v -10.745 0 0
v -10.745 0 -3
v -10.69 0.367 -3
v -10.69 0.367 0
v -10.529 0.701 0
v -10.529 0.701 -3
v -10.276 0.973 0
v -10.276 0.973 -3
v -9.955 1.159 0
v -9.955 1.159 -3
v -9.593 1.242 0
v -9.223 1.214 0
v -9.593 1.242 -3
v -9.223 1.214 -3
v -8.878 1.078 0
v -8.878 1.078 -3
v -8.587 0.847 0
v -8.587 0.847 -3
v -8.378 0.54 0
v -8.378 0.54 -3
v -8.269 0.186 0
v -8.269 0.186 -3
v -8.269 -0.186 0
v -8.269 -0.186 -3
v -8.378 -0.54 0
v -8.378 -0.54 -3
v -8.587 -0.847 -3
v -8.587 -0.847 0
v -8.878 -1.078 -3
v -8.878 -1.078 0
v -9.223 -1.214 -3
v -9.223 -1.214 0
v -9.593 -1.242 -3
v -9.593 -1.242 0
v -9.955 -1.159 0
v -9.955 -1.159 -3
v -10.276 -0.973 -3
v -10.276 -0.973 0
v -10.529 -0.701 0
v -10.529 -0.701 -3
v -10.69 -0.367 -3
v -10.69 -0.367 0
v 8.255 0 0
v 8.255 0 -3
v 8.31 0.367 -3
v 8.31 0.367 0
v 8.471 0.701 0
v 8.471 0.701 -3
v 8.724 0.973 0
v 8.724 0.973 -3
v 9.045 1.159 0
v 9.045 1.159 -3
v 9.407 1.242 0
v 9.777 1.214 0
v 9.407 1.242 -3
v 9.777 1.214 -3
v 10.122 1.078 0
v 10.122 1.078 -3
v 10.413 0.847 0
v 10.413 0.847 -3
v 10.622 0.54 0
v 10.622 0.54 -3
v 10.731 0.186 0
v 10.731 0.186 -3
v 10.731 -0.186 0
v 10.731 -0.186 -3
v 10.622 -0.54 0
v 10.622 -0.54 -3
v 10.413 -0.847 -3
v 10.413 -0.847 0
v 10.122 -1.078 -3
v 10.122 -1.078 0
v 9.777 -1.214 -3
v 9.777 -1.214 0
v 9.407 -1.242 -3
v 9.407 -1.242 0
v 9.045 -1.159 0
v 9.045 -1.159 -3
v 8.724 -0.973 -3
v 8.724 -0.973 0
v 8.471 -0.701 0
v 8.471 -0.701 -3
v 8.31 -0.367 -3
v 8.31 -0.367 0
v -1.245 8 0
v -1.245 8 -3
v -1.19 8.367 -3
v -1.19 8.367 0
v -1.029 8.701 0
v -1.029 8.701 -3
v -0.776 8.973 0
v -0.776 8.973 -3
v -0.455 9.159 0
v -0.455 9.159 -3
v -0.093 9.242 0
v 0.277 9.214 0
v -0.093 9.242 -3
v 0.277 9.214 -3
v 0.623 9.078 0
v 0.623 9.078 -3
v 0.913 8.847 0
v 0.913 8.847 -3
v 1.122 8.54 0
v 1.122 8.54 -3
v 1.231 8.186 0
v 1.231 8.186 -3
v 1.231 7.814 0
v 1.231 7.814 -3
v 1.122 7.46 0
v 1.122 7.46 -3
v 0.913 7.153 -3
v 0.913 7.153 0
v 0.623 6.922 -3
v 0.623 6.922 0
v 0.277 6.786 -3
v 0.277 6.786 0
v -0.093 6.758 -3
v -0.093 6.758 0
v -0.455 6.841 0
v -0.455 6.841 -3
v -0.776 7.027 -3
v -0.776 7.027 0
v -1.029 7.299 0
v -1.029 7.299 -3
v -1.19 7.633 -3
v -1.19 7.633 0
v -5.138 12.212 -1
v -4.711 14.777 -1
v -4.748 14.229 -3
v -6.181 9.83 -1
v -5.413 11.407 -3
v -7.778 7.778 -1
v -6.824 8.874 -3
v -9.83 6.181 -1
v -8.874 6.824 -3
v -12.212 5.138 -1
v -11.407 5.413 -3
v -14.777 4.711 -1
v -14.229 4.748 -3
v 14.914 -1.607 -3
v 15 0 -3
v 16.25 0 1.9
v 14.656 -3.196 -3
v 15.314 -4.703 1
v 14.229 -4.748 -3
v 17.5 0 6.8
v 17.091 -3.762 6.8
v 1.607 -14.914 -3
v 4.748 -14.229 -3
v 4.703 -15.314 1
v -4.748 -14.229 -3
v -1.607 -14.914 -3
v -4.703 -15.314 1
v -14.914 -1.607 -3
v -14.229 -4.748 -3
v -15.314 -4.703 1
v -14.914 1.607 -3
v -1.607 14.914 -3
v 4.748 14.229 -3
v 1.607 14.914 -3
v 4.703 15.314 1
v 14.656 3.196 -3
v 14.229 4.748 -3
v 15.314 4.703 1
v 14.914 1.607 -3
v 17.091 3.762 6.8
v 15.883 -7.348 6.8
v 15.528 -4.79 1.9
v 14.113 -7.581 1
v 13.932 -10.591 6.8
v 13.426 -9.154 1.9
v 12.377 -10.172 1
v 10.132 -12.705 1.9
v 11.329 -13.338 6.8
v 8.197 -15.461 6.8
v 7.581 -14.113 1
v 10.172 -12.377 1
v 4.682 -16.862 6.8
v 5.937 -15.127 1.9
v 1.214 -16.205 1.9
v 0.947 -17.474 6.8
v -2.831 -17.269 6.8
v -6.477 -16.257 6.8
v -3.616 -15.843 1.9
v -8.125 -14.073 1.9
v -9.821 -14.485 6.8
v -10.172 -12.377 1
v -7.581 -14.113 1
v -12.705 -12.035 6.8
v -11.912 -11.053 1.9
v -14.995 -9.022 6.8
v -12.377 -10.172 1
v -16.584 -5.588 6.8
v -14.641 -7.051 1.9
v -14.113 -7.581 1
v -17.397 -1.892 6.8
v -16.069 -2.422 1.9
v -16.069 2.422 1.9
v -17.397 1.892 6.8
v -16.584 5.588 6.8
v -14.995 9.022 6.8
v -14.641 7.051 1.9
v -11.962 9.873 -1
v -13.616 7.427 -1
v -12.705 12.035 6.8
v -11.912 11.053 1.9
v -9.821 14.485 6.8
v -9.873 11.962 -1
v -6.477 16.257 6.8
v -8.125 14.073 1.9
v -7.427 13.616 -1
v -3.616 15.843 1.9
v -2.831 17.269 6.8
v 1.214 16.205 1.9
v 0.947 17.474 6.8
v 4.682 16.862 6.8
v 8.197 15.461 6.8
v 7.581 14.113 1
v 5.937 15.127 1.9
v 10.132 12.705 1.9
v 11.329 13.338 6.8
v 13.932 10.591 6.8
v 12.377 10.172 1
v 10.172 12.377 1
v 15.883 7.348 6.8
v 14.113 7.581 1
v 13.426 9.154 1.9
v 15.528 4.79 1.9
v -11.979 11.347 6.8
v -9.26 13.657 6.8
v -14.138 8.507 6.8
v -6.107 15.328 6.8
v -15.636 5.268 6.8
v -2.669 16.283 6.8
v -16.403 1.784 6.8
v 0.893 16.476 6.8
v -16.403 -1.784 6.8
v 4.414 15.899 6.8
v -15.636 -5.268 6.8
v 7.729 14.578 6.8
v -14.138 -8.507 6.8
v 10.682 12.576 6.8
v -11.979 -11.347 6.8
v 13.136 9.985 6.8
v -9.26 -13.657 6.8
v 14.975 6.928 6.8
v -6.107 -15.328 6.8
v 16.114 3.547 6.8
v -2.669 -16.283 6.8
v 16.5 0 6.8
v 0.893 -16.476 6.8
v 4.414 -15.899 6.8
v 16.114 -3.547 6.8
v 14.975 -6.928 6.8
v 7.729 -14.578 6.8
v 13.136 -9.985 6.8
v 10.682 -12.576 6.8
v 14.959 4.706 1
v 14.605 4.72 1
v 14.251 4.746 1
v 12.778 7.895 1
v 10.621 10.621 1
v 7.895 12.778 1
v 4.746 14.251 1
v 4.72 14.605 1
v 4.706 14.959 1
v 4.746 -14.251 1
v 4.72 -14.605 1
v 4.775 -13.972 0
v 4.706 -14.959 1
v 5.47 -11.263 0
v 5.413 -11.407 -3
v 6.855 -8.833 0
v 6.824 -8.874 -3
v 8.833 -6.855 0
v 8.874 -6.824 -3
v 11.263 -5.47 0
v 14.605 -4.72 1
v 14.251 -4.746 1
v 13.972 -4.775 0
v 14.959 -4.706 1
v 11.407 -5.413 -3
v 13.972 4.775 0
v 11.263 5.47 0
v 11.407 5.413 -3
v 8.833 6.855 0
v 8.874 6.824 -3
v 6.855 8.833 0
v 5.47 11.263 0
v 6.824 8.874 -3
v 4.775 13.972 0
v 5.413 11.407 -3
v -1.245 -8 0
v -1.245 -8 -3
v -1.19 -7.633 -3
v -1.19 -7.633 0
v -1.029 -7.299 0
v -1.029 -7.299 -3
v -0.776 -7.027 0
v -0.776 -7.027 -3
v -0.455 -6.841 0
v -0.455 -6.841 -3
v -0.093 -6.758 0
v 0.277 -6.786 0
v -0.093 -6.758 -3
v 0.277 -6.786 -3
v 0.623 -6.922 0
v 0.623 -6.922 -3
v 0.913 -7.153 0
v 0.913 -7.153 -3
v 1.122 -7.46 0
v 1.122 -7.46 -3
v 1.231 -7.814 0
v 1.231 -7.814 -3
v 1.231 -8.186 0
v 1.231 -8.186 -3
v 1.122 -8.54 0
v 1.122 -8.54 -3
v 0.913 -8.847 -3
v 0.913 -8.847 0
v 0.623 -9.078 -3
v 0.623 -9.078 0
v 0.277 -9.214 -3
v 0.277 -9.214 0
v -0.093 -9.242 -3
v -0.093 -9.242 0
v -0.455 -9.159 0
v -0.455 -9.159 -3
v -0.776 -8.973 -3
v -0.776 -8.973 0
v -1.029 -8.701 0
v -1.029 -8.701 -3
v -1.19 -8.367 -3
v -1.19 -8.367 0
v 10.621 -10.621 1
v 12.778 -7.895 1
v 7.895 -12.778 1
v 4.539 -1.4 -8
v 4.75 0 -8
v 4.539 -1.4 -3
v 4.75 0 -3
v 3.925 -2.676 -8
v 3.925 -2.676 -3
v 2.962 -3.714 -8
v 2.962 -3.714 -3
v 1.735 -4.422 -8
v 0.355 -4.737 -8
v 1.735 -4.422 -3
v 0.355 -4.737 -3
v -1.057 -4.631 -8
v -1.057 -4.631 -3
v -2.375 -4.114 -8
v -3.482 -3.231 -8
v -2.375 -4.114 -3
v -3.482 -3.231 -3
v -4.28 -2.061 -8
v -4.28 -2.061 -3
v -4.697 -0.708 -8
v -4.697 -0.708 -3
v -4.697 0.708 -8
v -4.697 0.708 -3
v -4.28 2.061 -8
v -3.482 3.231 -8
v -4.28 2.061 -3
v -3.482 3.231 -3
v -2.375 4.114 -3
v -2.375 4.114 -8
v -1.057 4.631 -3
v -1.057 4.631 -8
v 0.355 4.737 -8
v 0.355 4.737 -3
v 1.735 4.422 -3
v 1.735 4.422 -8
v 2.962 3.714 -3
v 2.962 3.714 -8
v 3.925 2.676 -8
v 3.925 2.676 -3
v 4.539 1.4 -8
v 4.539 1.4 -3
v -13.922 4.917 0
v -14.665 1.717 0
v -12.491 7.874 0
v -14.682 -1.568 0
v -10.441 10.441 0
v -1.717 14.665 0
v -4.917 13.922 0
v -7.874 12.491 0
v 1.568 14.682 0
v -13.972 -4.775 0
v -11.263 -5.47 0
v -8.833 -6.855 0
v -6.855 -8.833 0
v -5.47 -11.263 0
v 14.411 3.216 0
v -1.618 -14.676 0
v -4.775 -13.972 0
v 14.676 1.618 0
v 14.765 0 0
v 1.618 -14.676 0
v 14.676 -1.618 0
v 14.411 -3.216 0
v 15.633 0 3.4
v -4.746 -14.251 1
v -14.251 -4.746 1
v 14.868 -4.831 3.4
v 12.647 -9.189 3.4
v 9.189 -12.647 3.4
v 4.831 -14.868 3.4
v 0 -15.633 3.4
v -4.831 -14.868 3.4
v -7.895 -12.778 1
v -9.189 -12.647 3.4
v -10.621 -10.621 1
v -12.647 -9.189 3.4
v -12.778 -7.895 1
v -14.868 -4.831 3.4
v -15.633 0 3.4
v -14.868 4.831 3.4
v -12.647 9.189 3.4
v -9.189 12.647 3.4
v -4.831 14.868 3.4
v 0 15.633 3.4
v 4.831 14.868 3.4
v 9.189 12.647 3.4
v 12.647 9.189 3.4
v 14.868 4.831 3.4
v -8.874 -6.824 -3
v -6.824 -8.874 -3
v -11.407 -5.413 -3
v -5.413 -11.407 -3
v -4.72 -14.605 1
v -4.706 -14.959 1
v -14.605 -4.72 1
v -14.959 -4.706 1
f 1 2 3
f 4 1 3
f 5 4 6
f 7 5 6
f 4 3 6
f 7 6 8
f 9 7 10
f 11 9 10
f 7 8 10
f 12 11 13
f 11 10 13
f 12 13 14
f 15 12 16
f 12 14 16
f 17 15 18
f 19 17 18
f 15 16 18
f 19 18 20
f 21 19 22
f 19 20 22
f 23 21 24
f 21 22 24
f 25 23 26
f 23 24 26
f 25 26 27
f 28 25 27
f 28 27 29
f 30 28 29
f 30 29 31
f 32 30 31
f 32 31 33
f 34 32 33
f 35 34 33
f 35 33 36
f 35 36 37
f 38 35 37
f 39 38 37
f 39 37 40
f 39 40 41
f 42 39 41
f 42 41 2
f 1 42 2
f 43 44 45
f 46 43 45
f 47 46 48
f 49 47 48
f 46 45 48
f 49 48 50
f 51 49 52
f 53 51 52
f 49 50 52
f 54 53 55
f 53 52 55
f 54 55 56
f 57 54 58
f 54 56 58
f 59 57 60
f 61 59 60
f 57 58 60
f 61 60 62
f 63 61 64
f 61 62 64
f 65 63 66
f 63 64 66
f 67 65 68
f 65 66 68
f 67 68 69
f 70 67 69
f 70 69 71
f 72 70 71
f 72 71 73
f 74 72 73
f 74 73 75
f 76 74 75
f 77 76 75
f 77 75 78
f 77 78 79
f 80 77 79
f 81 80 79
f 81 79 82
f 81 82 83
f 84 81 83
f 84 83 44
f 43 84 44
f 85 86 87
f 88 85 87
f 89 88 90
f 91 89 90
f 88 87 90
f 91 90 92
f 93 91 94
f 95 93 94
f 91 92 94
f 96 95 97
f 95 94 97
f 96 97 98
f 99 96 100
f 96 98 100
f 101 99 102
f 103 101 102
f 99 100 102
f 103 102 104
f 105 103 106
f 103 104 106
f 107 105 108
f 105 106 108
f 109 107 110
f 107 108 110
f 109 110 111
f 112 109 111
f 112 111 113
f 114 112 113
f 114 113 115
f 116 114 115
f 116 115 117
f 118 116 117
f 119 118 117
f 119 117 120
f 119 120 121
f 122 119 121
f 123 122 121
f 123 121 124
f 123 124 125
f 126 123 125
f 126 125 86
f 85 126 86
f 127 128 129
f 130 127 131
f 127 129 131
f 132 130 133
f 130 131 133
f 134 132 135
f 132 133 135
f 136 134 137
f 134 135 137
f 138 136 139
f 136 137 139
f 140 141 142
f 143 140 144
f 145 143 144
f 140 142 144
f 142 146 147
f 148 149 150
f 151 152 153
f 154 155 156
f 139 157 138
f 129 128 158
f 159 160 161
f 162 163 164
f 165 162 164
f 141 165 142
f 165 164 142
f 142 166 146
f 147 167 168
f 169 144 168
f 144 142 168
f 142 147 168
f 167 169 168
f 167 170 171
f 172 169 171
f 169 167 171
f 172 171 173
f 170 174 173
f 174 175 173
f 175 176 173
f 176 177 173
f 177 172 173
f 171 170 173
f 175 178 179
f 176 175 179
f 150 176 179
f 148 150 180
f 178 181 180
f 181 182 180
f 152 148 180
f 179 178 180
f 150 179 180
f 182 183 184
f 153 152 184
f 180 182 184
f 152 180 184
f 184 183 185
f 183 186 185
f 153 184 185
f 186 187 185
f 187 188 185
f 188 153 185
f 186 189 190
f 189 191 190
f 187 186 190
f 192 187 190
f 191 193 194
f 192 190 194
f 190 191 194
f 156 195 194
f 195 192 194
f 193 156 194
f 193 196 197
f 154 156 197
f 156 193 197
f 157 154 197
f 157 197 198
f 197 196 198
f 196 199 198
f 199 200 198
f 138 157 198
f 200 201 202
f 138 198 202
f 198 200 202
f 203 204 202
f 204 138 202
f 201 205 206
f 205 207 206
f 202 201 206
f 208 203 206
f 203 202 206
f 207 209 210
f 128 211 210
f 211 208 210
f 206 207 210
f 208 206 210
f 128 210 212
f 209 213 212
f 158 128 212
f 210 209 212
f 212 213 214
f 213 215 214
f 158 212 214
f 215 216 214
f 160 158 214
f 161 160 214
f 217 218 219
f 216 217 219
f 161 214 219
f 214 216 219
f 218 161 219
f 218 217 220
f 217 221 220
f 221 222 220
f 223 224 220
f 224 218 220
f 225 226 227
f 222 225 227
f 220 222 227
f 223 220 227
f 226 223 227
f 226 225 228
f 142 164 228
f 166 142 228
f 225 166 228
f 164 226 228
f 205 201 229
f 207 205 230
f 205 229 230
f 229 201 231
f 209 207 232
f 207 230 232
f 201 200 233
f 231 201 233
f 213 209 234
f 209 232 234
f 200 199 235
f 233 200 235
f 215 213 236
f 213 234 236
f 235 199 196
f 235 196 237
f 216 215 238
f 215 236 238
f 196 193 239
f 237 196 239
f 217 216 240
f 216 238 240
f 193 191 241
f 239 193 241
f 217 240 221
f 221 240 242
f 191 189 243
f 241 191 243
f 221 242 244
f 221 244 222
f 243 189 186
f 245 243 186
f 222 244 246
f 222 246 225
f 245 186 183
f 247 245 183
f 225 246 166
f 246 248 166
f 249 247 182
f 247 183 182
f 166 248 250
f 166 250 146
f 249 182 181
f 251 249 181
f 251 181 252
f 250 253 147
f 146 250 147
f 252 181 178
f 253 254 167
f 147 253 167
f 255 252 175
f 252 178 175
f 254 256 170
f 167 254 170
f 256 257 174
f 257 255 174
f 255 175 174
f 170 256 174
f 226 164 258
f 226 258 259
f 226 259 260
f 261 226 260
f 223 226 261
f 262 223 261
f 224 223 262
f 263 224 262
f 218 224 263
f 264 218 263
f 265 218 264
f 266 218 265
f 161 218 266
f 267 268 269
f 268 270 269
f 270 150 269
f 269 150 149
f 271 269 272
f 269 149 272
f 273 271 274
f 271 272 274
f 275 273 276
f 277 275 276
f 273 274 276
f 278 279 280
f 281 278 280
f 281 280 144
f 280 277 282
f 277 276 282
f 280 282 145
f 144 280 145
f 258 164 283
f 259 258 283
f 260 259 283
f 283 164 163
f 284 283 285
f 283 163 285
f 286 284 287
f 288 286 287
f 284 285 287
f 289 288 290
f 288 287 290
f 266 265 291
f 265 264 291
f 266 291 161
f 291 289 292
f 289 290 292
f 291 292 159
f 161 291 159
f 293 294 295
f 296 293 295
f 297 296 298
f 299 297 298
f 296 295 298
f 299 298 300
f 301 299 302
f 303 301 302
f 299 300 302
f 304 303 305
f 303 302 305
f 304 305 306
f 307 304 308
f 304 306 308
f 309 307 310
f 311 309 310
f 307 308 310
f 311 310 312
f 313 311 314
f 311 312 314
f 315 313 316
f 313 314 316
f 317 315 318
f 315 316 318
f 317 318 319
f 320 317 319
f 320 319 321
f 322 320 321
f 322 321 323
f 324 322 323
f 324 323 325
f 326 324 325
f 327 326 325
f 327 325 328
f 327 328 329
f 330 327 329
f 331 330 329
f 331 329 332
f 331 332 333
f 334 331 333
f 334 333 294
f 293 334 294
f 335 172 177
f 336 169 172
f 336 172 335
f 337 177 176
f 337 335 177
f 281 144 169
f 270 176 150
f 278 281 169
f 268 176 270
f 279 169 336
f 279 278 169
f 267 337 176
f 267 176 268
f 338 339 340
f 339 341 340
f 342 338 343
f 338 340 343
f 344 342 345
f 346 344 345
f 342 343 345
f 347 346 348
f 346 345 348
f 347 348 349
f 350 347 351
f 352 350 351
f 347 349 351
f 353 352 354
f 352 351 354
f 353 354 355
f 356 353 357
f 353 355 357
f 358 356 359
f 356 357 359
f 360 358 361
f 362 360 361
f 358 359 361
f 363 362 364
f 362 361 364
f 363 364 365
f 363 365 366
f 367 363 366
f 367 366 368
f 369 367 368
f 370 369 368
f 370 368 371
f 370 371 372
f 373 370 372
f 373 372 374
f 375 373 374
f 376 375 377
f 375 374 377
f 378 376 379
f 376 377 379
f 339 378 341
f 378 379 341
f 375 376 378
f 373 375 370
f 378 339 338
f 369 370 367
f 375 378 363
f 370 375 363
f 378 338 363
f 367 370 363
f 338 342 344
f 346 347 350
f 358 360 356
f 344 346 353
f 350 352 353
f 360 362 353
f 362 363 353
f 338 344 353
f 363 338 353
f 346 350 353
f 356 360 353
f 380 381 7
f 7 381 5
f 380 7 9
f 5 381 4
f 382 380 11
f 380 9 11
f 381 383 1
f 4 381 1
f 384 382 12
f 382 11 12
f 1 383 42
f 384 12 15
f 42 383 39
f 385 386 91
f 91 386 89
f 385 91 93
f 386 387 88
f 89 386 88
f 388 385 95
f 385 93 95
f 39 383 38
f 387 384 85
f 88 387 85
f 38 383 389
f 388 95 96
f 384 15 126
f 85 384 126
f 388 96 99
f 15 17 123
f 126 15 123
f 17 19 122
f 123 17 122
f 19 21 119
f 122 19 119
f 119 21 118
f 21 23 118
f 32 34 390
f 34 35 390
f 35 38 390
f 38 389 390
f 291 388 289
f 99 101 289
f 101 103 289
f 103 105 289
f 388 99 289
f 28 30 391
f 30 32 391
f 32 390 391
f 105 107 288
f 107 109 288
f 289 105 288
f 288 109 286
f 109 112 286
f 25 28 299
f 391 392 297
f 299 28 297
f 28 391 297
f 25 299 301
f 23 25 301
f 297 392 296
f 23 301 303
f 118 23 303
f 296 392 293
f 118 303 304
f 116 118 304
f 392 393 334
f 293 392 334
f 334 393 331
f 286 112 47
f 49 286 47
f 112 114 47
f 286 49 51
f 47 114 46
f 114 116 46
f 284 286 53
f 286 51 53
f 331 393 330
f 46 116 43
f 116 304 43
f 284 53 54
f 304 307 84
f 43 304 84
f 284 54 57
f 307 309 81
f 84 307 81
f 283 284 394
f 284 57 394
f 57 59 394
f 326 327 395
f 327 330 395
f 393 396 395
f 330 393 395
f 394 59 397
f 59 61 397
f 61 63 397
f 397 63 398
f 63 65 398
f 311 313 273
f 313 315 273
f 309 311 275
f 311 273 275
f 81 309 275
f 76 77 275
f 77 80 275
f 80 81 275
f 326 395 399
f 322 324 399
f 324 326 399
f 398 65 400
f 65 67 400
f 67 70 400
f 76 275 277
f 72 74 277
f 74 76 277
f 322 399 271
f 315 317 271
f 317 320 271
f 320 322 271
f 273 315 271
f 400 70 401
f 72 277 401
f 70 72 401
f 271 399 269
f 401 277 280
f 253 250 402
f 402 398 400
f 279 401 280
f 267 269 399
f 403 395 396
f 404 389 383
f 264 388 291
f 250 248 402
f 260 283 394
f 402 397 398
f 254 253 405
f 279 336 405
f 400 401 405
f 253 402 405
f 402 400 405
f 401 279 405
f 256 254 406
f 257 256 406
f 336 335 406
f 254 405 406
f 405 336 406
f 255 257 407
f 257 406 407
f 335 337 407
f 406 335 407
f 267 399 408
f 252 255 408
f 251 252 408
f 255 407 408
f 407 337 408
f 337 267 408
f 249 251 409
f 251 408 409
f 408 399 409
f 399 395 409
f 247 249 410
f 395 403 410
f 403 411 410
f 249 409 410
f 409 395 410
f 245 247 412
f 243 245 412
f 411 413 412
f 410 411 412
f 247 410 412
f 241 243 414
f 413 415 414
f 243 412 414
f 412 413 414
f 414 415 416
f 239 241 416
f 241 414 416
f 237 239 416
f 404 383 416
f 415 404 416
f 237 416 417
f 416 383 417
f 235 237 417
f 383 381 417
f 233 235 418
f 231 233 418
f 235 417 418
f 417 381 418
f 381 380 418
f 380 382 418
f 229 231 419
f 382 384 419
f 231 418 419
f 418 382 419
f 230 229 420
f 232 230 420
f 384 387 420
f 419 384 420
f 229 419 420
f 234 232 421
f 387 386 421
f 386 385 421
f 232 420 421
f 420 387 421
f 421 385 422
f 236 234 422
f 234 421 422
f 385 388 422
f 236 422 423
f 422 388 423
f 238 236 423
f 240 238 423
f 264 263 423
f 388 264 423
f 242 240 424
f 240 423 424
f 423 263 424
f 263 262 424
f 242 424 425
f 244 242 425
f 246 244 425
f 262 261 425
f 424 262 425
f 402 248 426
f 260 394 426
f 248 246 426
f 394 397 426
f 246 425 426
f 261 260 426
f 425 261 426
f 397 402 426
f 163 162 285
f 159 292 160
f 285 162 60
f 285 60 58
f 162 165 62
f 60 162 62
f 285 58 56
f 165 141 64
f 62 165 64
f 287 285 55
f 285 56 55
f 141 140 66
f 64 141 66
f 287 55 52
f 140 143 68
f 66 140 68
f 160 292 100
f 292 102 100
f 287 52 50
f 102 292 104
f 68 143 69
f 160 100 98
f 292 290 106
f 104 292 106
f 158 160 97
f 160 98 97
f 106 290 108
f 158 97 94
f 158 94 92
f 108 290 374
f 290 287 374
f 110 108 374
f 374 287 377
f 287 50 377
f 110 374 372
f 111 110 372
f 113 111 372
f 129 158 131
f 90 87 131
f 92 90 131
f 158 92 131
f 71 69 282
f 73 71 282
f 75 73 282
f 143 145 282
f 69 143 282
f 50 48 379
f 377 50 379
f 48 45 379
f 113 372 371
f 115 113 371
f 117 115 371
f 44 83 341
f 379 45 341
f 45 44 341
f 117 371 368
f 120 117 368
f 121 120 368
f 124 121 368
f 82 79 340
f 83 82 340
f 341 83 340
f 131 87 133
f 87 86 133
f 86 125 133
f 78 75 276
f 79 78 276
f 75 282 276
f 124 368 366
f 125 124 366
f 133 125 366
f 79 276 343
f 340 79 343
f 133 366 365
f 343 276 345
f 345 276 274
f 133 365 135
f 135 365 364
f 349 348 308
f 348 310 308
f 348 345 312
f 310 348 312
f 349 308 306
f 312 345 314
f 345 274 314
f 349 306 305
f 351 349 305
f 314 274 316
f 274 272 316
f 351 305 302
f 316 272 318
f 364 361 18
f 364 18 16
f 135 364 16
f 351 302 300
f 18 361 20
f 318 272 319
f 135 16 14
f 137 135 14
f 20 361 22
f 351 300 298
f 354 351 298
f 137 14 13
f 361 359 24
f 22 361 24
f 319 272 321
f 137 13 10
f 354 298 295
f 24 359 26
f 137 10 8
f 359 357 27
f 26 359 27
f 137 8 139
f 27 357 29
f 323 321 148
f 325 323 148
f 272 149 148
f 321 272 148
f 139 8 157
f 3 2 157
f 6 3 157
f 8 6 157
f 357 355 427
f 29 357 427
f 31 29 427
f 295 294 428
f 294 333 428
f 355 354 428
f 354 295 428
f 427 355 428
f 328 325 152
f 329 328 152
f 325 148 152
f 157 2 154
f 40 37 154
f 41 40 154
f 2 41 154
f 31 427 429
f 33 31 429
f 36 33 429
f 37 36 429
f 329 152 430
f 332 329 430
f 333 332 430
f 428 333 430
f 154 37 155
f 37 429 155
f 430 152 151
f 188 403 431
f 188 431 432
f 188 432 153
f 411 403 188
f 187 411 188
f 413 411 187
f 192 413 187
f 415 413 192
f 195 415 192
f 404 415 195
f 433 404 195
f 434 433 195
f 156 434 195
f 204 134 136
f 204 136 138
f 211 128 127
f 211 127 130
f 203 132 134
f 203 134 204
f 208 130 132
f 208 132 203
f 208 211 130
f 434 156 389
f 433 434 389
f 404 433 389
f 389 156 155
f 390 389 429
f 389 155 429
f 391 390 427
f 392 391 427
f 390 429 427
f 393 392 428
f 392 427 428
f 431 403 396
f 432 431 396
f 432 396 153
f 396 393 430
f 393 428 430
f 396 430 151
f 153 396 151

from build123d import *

# Parameters (mm, degrees)
SKETCH_2_R          = 1.245
SKETCH_2_R_2        = 10.5
CUT_EXTRUDE_1_DEPTH = 4
SKETCH_3_R          = 10.5
CUT_EXTRUDE_2_DEPTH = 2


with BuildPart() as part:
    # Эскиз1 → Повернуть1 (revolve)
    with BuildSketch(Plane(origin=(0, 0, 0), x_dir=(0, 0, -1), z_dir=(1, 0, 0)), mode=Mode.PRIVATE) as revolve_1_sk:
        Polygon((0, 0), (8, 0), (8, 4.75), (3, 4.75), (3, 15), (-6.8, 17.5), (-6.8, 16.5), (0, 14.765306122), align=None)
    revolve(revolve_1_sk.sketch.rotate(Axis((0, 0, 0), (0, 0, -1)), 90), axis=Axis((0, 0, 0), (0, 0, -1)))

    # Эскиз2 → Вырез-Вытянуть1 (cut)
    with BuildSketch(Plane(origin=(0, 0, -3), x_dir=(-1, 0, 0), z_dir=(0, 0, -1))):
        with Locations((0, 8)):
            Circle(SKETCH_2_R)
        with Locations((0, -8)):
            Circle(SKETCH_2_R)
        with Locations((9.5, 0)):
            Circle(SKETCH_2_R)
        with Locations((-9.5, 0)):
            Circle(SKETCH_2_R)
        with Locations((-15.202795796, -15.202795796)):
            Circle(SKETCH_2_R_2)
        with Locations((-15.202795796, 15.202795796)):
            Circle(SKETCH_2_R_2)
        with Locations((15.202795796, -15.202795796)):
            Circle(SKETCH_2_R_2)
    extrude(amount=-CUT_EXTRUDE_1_DEPTH, mode=Mode.SUBTRACT)

    # Эскиз3 → Вырез-Вытянуть2 (cut)
    with BuildSketch(Plane(origin=(0, 0, -3), x_dir=(-1, 0, 0), z_dir=(0, 0, -1))):
        with Locations((15.202795796, 15.202795796)):
            Circle(SKETCH_3_R)
    extrude(amount=-CUT_EXTRUDE_2_DEPTH, mode=Mode.SUBTRACT)


solid = part.part
